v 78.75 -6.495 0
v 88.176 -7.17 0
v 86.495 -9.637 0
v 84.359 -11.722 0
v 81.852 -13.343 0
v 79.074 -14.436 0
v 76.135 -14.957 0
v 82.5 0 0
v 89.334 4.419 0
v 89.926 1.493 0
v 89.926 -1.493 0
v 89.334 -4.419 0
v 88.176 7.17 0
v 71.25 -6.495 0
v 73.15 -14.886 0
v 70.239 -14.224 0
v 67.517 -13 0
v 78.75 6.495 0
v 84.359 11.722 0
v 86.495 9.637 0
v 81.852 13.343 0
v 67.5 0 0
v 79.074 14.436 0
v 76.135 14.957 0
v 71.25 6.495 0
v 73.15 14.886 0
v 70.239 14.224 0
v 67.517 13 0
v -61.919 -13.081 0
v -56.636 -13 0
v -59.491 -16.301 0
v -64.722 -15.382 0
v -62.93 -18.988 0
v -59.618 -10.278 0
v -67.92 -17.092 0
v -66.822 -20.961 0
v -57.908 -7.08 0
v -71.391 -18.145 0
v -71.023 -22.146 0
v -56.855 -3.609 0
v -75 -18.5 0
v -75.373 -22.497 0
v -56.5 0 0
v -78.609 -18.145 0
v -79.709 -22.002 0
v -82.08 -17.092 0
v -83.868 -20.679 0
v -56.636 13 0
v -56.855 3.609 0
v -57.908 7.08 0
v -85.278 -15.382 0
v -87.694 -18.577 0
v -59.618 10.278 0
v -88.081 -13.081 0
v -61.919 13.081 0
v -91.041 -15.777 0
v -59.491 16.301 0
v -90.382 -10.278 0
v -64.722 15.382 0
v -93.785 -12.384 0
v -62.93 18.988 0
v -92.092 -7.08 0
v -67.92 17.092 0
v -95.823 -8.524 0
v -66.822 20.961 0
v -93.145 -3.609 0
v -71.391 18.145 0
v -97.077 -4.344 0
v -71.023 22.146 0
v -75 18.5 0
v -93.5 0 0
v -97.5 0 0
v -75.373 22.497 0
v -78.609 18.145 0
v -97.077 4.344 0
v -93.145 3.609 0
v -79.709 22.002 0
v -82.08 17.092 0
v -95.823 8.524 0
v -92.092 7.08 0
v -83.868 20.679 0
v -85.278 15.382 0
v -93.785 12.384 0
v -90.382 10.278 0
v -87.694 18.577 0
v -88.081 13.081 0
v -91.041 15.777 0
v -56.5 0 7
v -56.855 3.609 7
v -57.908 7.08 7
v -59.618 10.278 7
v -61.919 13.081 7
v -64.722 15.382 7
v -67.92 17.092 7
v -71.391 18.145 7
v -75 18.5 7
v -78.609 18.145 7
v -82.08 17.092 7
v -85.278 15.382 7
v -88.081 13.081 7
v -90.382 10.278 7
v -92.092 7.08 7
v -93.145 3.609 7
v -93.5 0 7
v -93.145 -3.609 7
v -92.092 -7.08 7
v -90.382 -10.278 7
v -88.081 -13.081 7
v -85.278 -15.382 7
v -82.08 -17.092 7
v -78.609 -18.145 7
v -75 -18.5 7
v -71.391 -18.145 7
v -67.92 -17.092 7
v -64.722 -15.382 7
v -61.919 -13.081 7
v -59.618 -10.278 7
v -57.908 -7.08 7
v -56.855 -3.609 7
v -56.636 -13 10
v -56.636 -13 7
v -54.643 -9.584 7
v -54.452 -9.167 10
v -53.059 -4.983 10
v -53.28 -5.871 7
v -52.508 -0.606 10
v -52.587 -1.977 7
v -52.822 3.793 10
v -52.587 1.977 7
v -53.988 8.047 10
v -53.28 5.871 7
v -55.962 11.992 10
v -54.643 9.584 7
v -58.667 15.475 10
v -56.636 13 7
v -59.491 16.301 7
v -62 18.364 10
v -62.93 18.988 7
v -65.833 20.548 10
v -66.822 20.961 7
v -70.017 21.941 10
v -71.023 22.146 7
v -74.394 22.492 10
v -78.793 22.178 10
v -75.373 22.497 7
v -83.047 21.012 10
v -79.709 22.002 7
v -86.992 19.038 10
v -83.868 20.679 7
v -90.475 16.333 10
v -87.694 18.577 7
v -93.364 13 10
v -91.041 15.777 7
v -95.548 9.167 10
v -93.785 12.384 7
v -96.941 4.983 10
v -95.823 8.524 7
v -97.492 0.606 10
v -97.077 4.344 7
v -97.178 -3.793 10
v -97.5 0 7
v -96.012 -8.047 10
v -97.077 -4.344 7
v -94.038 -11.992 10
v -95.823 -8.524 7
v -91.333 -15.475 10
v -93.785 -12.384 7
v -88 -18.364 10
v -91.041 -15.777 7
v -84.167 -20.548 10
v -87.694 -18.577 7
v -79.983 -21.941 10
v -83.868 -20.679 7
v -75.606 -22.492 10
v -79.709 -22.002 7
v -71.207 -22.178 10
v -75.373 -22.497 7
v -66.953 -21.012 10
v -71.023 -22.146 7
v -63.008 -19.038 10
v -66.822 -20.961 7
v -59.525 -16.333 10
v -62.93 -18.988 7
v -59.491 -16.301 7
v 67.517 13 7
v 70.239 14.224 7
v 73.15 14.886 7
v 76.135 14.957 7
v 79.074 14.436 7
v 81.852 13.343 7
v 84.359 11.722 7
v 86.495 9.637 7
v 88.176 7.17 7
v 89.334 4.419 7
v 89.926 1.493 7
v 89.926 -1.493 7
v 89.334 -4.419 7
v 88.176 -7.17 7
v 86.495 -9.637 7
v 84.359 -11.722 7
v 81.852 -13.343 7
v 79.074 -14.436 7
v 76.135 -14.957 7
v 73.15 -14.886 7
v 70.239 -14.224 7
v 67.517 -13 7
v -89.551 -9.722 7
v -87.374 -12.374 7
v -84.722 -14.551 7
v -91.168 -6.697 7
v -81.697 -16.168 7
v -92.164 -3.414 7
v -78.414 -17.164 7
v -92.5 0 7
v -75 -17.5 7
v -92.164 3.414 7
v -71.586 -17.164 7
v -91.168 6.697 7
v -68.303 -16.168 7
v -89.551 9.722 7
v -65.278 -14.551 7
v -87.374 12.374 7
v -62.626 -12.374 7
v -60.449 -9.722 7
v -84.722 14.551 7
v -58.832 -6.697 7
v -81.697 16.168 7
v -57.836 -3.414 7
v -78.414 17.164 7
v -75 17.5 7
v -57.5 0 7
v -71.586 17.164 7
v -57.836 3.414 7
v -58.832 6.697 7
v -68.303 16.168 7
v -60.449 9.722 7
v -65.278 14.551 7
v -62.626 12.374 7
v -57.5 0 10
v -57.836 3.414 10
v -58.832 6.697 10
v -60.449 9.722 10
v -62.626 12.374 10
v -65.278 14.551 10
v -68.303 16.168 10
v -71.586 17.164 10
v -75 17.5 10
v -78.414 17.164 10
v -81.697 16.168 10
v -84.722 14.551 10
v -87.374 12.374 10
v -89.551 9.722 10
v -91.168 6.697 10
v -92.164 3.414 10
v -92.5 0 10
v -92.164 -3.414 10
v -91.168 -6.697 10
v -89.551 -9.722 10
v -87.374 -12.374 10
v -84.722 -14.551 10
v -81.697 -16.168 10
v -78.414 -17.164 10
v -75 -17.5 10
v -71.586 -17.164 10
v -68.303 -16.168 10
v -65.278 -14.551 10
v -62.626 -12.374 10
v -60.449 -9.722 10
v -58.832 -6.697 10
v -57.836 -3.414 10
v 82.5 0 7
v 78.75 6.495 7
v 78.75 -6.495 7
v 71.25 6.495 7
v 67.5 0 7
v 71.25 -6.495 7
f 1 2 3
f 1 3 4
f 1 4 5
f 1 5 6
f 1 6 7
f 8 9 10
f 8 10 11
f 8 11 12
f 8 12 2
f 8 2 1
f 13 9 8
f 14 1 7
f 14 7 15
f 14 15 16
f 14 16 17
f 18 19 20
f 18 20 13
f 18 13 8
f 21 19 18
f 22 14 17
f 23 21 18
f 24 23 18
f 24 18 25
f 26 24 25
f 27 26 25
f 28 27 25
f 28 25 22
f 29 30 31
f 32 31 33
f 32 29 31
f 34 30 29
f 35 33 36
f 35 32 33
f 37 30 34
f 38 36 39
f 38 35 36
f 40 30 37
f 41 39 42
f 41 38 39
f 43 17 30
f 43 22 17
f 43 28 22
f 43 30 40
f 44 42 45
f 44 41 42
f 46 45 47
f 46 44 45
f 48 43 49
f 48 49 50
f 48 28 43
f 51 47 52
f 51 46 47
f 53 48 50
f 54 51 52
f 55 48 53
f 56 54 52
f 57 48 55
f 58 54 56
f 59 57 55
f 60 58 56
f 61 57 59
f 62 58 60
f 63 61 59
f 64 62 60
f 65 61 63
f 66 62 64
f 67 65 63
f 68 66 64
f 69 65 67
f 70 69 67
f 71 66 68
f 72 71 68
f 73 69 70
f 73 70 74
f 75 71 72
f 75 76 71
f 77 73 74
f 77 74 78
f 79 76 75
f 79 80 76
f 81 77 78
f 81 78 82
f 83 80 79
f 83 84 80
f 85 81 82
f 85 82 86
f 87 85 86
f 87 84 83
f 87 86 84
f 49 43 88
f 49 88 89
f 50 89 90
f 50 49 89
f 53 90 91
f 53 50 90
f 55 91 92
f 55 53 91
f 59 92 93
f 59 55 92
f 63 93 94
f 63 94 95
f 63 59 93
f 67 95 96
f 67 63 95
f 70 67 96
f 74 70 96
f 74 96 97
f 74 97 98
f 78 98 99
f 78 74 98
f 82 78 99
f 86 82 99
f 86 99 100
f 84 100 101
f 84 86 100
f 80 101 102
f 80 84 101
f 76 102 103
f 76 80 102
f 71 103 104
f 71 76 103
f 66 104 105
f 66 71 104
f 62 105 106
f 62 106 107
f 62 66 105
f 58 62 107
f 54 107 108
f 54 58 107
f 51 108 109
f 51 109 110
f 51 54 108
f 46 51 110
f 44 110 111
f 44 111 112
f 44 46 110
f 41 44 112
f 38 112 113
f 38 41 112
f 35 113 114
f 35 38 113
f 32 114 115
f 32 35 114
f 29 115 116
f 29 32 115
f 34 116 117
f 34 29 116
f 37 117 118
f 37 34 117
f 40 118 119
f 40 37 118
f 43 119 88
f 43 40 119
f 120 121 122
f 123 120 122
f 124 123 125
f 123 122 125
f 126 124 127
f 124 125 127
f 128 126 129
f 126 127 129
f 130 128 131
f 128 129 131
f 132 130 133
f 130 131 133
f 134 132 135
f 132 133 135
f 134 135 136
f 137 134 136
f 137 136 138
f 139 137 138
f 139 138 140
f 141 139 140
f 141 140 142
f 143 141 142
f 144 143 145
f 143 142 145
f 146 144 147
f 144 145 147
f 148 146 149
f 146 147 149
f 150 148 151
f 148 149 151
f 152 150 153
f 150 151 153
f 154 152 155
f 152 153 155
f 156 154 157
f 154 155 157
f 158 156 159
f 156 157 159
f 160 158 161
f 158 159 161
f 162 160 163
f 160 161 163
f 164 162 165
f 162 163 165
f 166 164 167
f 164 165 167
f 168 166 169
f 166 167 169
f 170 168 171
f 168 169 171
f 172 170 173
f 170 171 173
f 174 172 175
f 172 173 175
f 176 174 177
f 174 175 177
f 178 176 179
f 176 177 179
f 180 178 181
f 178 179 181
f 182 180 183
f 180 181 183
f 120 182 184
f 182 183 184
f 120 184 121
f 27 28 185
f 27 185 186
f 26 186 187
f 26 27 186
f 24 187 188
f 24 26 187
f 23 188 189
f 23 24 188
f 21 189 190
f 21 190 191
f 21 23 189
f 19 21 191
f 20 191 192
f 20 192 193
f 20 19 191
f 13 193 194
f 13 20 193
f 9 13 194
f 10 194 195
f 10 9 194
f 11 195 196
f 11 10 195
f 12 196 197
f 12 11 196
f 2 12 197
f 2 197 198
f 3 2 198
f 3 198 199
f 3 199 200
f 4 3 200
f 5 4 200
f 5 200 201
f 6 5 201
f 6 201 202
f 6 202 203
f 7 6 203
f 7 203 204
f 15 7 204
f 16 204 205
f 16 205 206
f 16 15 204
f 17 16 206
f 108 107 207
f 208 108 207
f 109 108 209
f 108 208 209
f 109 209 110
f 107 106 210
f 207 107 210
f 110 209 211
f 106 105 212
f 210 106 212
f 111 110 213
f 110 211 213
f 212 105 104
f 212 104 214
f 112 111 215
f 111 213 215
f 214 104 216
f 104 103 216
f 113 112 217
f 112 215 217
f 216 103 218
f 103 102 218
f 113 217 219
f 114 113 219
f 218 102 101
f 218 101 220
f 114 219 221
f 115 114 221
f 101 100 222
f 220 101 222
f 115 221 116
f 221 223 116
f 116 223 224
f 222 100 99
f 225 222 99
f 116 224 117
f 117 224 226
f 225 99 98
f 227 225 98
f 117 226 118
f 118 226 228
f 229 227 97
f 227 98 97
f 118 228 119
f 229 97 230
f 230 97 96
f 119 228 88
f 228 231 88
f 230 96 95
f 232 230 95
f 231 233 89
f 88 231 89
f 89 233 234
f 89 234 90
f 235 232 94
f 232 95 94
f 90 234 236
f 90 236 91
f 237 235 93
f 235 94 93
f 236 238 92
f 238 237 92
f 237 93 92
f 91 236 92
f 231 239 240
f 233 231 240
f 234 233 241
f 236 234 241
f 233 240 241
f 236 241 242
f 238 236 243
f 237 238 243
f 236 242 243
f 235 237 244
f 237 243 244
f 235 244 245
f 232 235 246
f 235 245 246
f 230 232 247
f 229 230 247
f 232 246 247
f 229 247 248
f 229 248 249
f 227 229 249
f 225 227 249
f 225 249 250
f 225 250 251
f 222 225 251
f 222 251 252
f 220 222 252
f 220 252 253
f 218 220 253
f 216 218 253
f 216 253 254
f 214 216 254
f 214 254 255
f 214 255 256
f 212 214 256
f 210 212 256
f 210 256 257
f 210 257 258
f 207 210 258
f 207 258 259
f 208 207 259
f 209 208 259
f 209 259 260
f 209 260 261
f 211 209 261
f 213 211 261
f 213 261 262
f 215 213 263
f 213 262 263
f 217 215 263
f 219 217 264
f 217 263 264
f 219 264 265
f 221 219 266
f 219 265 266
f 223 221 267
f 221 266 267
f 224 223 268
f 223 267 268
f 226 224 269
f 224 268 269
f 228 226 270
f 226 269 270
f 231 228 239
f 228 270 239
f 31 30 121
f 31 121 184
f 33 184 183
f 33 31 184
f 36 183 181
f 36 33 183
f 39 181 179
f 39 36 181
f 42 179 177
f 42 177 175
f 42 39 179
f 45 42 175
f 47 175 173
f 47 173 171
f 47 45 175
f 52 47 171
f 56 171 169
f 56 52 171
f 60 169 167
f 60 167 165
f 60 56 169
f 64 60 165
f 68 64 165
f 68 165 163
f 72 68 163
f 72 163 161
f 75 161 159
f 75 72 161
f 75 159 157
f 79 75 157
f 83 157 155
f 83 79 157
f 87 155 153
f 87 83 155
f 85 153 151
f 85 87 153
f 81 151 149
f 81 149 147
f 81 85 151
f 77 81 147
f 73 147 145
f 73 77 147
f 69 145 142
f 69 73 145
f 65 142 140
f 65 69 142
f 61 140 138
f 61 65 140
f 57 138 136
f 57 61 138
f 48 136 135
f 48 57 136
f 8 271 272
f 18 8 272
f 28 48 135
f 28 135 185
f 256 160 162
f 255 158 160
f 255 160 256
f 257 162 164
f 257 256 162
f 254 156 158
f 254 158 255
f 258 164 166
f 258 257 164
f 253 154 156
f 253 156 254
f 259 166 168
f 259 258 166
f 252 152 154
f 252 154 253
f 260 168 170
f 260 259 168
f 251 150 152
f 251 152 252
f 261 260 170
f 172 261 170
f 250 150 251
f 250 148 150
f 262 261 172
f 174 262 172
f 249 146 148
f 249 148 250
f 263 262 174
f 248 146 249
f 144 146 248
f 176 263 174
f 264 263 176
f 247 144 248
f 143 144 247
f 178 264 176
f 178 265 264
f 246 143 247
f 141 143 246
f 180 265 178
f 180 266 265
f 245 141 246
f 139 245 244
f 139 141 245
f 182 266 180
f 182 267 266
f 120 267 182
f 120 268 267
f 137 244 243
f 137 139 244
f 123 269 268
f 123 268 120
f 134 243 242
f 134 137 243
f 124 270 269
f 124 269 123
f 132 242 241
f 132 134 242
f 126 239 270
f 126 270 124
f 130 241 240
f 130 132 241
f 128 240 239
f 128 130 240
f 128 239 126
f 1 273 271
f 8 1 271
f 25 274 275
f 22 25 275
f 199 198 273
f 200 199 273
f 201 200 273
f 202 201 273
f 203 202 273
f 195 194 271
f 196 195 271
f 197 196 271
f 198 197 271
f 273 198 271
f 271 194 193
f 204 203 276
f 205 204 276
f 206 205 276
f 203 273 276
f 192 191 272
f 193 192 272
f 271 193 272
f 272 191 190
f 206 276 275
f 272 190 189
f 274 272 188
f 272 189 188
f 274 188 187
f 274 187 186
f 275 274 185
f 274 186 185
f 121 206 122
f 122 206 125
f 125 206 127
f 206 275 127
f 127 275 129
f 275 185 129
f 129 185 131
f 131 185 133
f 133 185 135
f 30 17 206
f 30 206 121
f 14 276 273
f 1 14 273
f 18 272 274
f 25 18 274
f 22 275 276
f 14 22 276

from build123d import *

# Parameters (mm, degrees)
BOSS_EXTRUDE1_DEPTH = 7
SKETCH2_R           = 22.5
BOSS_EXTRUDE2_DEPTH = 3
CUT_EXTRUDE1_DEPTH  = 101.307028667
SKETCH4_R           = 17.5
CUT_EXTRUDE2_DEPTH  = 101.560926806
SKETCH5_R           = 18.5
CUT_EXTRUDE3_DEPTH  = 7


with BuildPart() as part:
    # Sketch1 → Boss-Extrude1 (new body)
    with BuildSketch(Plane.XY):
        with BuildLine():
            Line((-56.635632328, 13), (67.516685226, 13))
            ThreePointArc((67.516685226, 13), (90, 0), (67.516685226, -13))
            Line((67.516685226, -13), (-56.635632328, -13))
            ThreePointArc((-56.635632328, -13), (-97.5, 0), (-56.635632328, 13))
        make_face()
    extrude(amount=BOSS_EXTRUDE1_DEPTH)

    # Sketch2 → Boss-Extrude2 (add)
    with BuildSketch(Plane.XY.offset(7)):
        with Locations(Location((-75, 0, 0), (0, 0, 324.705605323))):
            Circle(SKETCH2_R)
    extrude(amount=BOSS_EXTRUDE2_DEPTH)

    # Sketch3 → Cut-Extrude1 (cut, through all)
    with BuildSketch(Plane.XY.offset(7)):
        Polygon((82.5, 0), (78.75, 6.495190528), (71.25, 6.495190528), (67.5, 0), (71.25, -6.495190528), (78.75, -6.495190528), align=None)
    extrude(amount=-CUT_EXTRUDE1_DEPTH, mode=Mode.SUBTRACT)

    # Sketch4 → Cut-Extrude2 (cut, through all)
    with BuildSketch(Plane.XY.offset(10)):
        with Locations((-75, 0)):
            Circle(SKETCH4_R)
    extrude(amount=-CUT_EXTRUDE2_DEPTH, mode=Mode.SUBTRACT)

    # Sketch5 → Cut-Extrude3 (cut)
    with BuildSketch(Plane.XY):
        with Locations((-75, 0)):
            Circle(SKETCH5_R)
    extrude(amount=CUT_EXTRUDE3_DEPTH, mode=Mode.SUBTRACT)


solid = part.part
